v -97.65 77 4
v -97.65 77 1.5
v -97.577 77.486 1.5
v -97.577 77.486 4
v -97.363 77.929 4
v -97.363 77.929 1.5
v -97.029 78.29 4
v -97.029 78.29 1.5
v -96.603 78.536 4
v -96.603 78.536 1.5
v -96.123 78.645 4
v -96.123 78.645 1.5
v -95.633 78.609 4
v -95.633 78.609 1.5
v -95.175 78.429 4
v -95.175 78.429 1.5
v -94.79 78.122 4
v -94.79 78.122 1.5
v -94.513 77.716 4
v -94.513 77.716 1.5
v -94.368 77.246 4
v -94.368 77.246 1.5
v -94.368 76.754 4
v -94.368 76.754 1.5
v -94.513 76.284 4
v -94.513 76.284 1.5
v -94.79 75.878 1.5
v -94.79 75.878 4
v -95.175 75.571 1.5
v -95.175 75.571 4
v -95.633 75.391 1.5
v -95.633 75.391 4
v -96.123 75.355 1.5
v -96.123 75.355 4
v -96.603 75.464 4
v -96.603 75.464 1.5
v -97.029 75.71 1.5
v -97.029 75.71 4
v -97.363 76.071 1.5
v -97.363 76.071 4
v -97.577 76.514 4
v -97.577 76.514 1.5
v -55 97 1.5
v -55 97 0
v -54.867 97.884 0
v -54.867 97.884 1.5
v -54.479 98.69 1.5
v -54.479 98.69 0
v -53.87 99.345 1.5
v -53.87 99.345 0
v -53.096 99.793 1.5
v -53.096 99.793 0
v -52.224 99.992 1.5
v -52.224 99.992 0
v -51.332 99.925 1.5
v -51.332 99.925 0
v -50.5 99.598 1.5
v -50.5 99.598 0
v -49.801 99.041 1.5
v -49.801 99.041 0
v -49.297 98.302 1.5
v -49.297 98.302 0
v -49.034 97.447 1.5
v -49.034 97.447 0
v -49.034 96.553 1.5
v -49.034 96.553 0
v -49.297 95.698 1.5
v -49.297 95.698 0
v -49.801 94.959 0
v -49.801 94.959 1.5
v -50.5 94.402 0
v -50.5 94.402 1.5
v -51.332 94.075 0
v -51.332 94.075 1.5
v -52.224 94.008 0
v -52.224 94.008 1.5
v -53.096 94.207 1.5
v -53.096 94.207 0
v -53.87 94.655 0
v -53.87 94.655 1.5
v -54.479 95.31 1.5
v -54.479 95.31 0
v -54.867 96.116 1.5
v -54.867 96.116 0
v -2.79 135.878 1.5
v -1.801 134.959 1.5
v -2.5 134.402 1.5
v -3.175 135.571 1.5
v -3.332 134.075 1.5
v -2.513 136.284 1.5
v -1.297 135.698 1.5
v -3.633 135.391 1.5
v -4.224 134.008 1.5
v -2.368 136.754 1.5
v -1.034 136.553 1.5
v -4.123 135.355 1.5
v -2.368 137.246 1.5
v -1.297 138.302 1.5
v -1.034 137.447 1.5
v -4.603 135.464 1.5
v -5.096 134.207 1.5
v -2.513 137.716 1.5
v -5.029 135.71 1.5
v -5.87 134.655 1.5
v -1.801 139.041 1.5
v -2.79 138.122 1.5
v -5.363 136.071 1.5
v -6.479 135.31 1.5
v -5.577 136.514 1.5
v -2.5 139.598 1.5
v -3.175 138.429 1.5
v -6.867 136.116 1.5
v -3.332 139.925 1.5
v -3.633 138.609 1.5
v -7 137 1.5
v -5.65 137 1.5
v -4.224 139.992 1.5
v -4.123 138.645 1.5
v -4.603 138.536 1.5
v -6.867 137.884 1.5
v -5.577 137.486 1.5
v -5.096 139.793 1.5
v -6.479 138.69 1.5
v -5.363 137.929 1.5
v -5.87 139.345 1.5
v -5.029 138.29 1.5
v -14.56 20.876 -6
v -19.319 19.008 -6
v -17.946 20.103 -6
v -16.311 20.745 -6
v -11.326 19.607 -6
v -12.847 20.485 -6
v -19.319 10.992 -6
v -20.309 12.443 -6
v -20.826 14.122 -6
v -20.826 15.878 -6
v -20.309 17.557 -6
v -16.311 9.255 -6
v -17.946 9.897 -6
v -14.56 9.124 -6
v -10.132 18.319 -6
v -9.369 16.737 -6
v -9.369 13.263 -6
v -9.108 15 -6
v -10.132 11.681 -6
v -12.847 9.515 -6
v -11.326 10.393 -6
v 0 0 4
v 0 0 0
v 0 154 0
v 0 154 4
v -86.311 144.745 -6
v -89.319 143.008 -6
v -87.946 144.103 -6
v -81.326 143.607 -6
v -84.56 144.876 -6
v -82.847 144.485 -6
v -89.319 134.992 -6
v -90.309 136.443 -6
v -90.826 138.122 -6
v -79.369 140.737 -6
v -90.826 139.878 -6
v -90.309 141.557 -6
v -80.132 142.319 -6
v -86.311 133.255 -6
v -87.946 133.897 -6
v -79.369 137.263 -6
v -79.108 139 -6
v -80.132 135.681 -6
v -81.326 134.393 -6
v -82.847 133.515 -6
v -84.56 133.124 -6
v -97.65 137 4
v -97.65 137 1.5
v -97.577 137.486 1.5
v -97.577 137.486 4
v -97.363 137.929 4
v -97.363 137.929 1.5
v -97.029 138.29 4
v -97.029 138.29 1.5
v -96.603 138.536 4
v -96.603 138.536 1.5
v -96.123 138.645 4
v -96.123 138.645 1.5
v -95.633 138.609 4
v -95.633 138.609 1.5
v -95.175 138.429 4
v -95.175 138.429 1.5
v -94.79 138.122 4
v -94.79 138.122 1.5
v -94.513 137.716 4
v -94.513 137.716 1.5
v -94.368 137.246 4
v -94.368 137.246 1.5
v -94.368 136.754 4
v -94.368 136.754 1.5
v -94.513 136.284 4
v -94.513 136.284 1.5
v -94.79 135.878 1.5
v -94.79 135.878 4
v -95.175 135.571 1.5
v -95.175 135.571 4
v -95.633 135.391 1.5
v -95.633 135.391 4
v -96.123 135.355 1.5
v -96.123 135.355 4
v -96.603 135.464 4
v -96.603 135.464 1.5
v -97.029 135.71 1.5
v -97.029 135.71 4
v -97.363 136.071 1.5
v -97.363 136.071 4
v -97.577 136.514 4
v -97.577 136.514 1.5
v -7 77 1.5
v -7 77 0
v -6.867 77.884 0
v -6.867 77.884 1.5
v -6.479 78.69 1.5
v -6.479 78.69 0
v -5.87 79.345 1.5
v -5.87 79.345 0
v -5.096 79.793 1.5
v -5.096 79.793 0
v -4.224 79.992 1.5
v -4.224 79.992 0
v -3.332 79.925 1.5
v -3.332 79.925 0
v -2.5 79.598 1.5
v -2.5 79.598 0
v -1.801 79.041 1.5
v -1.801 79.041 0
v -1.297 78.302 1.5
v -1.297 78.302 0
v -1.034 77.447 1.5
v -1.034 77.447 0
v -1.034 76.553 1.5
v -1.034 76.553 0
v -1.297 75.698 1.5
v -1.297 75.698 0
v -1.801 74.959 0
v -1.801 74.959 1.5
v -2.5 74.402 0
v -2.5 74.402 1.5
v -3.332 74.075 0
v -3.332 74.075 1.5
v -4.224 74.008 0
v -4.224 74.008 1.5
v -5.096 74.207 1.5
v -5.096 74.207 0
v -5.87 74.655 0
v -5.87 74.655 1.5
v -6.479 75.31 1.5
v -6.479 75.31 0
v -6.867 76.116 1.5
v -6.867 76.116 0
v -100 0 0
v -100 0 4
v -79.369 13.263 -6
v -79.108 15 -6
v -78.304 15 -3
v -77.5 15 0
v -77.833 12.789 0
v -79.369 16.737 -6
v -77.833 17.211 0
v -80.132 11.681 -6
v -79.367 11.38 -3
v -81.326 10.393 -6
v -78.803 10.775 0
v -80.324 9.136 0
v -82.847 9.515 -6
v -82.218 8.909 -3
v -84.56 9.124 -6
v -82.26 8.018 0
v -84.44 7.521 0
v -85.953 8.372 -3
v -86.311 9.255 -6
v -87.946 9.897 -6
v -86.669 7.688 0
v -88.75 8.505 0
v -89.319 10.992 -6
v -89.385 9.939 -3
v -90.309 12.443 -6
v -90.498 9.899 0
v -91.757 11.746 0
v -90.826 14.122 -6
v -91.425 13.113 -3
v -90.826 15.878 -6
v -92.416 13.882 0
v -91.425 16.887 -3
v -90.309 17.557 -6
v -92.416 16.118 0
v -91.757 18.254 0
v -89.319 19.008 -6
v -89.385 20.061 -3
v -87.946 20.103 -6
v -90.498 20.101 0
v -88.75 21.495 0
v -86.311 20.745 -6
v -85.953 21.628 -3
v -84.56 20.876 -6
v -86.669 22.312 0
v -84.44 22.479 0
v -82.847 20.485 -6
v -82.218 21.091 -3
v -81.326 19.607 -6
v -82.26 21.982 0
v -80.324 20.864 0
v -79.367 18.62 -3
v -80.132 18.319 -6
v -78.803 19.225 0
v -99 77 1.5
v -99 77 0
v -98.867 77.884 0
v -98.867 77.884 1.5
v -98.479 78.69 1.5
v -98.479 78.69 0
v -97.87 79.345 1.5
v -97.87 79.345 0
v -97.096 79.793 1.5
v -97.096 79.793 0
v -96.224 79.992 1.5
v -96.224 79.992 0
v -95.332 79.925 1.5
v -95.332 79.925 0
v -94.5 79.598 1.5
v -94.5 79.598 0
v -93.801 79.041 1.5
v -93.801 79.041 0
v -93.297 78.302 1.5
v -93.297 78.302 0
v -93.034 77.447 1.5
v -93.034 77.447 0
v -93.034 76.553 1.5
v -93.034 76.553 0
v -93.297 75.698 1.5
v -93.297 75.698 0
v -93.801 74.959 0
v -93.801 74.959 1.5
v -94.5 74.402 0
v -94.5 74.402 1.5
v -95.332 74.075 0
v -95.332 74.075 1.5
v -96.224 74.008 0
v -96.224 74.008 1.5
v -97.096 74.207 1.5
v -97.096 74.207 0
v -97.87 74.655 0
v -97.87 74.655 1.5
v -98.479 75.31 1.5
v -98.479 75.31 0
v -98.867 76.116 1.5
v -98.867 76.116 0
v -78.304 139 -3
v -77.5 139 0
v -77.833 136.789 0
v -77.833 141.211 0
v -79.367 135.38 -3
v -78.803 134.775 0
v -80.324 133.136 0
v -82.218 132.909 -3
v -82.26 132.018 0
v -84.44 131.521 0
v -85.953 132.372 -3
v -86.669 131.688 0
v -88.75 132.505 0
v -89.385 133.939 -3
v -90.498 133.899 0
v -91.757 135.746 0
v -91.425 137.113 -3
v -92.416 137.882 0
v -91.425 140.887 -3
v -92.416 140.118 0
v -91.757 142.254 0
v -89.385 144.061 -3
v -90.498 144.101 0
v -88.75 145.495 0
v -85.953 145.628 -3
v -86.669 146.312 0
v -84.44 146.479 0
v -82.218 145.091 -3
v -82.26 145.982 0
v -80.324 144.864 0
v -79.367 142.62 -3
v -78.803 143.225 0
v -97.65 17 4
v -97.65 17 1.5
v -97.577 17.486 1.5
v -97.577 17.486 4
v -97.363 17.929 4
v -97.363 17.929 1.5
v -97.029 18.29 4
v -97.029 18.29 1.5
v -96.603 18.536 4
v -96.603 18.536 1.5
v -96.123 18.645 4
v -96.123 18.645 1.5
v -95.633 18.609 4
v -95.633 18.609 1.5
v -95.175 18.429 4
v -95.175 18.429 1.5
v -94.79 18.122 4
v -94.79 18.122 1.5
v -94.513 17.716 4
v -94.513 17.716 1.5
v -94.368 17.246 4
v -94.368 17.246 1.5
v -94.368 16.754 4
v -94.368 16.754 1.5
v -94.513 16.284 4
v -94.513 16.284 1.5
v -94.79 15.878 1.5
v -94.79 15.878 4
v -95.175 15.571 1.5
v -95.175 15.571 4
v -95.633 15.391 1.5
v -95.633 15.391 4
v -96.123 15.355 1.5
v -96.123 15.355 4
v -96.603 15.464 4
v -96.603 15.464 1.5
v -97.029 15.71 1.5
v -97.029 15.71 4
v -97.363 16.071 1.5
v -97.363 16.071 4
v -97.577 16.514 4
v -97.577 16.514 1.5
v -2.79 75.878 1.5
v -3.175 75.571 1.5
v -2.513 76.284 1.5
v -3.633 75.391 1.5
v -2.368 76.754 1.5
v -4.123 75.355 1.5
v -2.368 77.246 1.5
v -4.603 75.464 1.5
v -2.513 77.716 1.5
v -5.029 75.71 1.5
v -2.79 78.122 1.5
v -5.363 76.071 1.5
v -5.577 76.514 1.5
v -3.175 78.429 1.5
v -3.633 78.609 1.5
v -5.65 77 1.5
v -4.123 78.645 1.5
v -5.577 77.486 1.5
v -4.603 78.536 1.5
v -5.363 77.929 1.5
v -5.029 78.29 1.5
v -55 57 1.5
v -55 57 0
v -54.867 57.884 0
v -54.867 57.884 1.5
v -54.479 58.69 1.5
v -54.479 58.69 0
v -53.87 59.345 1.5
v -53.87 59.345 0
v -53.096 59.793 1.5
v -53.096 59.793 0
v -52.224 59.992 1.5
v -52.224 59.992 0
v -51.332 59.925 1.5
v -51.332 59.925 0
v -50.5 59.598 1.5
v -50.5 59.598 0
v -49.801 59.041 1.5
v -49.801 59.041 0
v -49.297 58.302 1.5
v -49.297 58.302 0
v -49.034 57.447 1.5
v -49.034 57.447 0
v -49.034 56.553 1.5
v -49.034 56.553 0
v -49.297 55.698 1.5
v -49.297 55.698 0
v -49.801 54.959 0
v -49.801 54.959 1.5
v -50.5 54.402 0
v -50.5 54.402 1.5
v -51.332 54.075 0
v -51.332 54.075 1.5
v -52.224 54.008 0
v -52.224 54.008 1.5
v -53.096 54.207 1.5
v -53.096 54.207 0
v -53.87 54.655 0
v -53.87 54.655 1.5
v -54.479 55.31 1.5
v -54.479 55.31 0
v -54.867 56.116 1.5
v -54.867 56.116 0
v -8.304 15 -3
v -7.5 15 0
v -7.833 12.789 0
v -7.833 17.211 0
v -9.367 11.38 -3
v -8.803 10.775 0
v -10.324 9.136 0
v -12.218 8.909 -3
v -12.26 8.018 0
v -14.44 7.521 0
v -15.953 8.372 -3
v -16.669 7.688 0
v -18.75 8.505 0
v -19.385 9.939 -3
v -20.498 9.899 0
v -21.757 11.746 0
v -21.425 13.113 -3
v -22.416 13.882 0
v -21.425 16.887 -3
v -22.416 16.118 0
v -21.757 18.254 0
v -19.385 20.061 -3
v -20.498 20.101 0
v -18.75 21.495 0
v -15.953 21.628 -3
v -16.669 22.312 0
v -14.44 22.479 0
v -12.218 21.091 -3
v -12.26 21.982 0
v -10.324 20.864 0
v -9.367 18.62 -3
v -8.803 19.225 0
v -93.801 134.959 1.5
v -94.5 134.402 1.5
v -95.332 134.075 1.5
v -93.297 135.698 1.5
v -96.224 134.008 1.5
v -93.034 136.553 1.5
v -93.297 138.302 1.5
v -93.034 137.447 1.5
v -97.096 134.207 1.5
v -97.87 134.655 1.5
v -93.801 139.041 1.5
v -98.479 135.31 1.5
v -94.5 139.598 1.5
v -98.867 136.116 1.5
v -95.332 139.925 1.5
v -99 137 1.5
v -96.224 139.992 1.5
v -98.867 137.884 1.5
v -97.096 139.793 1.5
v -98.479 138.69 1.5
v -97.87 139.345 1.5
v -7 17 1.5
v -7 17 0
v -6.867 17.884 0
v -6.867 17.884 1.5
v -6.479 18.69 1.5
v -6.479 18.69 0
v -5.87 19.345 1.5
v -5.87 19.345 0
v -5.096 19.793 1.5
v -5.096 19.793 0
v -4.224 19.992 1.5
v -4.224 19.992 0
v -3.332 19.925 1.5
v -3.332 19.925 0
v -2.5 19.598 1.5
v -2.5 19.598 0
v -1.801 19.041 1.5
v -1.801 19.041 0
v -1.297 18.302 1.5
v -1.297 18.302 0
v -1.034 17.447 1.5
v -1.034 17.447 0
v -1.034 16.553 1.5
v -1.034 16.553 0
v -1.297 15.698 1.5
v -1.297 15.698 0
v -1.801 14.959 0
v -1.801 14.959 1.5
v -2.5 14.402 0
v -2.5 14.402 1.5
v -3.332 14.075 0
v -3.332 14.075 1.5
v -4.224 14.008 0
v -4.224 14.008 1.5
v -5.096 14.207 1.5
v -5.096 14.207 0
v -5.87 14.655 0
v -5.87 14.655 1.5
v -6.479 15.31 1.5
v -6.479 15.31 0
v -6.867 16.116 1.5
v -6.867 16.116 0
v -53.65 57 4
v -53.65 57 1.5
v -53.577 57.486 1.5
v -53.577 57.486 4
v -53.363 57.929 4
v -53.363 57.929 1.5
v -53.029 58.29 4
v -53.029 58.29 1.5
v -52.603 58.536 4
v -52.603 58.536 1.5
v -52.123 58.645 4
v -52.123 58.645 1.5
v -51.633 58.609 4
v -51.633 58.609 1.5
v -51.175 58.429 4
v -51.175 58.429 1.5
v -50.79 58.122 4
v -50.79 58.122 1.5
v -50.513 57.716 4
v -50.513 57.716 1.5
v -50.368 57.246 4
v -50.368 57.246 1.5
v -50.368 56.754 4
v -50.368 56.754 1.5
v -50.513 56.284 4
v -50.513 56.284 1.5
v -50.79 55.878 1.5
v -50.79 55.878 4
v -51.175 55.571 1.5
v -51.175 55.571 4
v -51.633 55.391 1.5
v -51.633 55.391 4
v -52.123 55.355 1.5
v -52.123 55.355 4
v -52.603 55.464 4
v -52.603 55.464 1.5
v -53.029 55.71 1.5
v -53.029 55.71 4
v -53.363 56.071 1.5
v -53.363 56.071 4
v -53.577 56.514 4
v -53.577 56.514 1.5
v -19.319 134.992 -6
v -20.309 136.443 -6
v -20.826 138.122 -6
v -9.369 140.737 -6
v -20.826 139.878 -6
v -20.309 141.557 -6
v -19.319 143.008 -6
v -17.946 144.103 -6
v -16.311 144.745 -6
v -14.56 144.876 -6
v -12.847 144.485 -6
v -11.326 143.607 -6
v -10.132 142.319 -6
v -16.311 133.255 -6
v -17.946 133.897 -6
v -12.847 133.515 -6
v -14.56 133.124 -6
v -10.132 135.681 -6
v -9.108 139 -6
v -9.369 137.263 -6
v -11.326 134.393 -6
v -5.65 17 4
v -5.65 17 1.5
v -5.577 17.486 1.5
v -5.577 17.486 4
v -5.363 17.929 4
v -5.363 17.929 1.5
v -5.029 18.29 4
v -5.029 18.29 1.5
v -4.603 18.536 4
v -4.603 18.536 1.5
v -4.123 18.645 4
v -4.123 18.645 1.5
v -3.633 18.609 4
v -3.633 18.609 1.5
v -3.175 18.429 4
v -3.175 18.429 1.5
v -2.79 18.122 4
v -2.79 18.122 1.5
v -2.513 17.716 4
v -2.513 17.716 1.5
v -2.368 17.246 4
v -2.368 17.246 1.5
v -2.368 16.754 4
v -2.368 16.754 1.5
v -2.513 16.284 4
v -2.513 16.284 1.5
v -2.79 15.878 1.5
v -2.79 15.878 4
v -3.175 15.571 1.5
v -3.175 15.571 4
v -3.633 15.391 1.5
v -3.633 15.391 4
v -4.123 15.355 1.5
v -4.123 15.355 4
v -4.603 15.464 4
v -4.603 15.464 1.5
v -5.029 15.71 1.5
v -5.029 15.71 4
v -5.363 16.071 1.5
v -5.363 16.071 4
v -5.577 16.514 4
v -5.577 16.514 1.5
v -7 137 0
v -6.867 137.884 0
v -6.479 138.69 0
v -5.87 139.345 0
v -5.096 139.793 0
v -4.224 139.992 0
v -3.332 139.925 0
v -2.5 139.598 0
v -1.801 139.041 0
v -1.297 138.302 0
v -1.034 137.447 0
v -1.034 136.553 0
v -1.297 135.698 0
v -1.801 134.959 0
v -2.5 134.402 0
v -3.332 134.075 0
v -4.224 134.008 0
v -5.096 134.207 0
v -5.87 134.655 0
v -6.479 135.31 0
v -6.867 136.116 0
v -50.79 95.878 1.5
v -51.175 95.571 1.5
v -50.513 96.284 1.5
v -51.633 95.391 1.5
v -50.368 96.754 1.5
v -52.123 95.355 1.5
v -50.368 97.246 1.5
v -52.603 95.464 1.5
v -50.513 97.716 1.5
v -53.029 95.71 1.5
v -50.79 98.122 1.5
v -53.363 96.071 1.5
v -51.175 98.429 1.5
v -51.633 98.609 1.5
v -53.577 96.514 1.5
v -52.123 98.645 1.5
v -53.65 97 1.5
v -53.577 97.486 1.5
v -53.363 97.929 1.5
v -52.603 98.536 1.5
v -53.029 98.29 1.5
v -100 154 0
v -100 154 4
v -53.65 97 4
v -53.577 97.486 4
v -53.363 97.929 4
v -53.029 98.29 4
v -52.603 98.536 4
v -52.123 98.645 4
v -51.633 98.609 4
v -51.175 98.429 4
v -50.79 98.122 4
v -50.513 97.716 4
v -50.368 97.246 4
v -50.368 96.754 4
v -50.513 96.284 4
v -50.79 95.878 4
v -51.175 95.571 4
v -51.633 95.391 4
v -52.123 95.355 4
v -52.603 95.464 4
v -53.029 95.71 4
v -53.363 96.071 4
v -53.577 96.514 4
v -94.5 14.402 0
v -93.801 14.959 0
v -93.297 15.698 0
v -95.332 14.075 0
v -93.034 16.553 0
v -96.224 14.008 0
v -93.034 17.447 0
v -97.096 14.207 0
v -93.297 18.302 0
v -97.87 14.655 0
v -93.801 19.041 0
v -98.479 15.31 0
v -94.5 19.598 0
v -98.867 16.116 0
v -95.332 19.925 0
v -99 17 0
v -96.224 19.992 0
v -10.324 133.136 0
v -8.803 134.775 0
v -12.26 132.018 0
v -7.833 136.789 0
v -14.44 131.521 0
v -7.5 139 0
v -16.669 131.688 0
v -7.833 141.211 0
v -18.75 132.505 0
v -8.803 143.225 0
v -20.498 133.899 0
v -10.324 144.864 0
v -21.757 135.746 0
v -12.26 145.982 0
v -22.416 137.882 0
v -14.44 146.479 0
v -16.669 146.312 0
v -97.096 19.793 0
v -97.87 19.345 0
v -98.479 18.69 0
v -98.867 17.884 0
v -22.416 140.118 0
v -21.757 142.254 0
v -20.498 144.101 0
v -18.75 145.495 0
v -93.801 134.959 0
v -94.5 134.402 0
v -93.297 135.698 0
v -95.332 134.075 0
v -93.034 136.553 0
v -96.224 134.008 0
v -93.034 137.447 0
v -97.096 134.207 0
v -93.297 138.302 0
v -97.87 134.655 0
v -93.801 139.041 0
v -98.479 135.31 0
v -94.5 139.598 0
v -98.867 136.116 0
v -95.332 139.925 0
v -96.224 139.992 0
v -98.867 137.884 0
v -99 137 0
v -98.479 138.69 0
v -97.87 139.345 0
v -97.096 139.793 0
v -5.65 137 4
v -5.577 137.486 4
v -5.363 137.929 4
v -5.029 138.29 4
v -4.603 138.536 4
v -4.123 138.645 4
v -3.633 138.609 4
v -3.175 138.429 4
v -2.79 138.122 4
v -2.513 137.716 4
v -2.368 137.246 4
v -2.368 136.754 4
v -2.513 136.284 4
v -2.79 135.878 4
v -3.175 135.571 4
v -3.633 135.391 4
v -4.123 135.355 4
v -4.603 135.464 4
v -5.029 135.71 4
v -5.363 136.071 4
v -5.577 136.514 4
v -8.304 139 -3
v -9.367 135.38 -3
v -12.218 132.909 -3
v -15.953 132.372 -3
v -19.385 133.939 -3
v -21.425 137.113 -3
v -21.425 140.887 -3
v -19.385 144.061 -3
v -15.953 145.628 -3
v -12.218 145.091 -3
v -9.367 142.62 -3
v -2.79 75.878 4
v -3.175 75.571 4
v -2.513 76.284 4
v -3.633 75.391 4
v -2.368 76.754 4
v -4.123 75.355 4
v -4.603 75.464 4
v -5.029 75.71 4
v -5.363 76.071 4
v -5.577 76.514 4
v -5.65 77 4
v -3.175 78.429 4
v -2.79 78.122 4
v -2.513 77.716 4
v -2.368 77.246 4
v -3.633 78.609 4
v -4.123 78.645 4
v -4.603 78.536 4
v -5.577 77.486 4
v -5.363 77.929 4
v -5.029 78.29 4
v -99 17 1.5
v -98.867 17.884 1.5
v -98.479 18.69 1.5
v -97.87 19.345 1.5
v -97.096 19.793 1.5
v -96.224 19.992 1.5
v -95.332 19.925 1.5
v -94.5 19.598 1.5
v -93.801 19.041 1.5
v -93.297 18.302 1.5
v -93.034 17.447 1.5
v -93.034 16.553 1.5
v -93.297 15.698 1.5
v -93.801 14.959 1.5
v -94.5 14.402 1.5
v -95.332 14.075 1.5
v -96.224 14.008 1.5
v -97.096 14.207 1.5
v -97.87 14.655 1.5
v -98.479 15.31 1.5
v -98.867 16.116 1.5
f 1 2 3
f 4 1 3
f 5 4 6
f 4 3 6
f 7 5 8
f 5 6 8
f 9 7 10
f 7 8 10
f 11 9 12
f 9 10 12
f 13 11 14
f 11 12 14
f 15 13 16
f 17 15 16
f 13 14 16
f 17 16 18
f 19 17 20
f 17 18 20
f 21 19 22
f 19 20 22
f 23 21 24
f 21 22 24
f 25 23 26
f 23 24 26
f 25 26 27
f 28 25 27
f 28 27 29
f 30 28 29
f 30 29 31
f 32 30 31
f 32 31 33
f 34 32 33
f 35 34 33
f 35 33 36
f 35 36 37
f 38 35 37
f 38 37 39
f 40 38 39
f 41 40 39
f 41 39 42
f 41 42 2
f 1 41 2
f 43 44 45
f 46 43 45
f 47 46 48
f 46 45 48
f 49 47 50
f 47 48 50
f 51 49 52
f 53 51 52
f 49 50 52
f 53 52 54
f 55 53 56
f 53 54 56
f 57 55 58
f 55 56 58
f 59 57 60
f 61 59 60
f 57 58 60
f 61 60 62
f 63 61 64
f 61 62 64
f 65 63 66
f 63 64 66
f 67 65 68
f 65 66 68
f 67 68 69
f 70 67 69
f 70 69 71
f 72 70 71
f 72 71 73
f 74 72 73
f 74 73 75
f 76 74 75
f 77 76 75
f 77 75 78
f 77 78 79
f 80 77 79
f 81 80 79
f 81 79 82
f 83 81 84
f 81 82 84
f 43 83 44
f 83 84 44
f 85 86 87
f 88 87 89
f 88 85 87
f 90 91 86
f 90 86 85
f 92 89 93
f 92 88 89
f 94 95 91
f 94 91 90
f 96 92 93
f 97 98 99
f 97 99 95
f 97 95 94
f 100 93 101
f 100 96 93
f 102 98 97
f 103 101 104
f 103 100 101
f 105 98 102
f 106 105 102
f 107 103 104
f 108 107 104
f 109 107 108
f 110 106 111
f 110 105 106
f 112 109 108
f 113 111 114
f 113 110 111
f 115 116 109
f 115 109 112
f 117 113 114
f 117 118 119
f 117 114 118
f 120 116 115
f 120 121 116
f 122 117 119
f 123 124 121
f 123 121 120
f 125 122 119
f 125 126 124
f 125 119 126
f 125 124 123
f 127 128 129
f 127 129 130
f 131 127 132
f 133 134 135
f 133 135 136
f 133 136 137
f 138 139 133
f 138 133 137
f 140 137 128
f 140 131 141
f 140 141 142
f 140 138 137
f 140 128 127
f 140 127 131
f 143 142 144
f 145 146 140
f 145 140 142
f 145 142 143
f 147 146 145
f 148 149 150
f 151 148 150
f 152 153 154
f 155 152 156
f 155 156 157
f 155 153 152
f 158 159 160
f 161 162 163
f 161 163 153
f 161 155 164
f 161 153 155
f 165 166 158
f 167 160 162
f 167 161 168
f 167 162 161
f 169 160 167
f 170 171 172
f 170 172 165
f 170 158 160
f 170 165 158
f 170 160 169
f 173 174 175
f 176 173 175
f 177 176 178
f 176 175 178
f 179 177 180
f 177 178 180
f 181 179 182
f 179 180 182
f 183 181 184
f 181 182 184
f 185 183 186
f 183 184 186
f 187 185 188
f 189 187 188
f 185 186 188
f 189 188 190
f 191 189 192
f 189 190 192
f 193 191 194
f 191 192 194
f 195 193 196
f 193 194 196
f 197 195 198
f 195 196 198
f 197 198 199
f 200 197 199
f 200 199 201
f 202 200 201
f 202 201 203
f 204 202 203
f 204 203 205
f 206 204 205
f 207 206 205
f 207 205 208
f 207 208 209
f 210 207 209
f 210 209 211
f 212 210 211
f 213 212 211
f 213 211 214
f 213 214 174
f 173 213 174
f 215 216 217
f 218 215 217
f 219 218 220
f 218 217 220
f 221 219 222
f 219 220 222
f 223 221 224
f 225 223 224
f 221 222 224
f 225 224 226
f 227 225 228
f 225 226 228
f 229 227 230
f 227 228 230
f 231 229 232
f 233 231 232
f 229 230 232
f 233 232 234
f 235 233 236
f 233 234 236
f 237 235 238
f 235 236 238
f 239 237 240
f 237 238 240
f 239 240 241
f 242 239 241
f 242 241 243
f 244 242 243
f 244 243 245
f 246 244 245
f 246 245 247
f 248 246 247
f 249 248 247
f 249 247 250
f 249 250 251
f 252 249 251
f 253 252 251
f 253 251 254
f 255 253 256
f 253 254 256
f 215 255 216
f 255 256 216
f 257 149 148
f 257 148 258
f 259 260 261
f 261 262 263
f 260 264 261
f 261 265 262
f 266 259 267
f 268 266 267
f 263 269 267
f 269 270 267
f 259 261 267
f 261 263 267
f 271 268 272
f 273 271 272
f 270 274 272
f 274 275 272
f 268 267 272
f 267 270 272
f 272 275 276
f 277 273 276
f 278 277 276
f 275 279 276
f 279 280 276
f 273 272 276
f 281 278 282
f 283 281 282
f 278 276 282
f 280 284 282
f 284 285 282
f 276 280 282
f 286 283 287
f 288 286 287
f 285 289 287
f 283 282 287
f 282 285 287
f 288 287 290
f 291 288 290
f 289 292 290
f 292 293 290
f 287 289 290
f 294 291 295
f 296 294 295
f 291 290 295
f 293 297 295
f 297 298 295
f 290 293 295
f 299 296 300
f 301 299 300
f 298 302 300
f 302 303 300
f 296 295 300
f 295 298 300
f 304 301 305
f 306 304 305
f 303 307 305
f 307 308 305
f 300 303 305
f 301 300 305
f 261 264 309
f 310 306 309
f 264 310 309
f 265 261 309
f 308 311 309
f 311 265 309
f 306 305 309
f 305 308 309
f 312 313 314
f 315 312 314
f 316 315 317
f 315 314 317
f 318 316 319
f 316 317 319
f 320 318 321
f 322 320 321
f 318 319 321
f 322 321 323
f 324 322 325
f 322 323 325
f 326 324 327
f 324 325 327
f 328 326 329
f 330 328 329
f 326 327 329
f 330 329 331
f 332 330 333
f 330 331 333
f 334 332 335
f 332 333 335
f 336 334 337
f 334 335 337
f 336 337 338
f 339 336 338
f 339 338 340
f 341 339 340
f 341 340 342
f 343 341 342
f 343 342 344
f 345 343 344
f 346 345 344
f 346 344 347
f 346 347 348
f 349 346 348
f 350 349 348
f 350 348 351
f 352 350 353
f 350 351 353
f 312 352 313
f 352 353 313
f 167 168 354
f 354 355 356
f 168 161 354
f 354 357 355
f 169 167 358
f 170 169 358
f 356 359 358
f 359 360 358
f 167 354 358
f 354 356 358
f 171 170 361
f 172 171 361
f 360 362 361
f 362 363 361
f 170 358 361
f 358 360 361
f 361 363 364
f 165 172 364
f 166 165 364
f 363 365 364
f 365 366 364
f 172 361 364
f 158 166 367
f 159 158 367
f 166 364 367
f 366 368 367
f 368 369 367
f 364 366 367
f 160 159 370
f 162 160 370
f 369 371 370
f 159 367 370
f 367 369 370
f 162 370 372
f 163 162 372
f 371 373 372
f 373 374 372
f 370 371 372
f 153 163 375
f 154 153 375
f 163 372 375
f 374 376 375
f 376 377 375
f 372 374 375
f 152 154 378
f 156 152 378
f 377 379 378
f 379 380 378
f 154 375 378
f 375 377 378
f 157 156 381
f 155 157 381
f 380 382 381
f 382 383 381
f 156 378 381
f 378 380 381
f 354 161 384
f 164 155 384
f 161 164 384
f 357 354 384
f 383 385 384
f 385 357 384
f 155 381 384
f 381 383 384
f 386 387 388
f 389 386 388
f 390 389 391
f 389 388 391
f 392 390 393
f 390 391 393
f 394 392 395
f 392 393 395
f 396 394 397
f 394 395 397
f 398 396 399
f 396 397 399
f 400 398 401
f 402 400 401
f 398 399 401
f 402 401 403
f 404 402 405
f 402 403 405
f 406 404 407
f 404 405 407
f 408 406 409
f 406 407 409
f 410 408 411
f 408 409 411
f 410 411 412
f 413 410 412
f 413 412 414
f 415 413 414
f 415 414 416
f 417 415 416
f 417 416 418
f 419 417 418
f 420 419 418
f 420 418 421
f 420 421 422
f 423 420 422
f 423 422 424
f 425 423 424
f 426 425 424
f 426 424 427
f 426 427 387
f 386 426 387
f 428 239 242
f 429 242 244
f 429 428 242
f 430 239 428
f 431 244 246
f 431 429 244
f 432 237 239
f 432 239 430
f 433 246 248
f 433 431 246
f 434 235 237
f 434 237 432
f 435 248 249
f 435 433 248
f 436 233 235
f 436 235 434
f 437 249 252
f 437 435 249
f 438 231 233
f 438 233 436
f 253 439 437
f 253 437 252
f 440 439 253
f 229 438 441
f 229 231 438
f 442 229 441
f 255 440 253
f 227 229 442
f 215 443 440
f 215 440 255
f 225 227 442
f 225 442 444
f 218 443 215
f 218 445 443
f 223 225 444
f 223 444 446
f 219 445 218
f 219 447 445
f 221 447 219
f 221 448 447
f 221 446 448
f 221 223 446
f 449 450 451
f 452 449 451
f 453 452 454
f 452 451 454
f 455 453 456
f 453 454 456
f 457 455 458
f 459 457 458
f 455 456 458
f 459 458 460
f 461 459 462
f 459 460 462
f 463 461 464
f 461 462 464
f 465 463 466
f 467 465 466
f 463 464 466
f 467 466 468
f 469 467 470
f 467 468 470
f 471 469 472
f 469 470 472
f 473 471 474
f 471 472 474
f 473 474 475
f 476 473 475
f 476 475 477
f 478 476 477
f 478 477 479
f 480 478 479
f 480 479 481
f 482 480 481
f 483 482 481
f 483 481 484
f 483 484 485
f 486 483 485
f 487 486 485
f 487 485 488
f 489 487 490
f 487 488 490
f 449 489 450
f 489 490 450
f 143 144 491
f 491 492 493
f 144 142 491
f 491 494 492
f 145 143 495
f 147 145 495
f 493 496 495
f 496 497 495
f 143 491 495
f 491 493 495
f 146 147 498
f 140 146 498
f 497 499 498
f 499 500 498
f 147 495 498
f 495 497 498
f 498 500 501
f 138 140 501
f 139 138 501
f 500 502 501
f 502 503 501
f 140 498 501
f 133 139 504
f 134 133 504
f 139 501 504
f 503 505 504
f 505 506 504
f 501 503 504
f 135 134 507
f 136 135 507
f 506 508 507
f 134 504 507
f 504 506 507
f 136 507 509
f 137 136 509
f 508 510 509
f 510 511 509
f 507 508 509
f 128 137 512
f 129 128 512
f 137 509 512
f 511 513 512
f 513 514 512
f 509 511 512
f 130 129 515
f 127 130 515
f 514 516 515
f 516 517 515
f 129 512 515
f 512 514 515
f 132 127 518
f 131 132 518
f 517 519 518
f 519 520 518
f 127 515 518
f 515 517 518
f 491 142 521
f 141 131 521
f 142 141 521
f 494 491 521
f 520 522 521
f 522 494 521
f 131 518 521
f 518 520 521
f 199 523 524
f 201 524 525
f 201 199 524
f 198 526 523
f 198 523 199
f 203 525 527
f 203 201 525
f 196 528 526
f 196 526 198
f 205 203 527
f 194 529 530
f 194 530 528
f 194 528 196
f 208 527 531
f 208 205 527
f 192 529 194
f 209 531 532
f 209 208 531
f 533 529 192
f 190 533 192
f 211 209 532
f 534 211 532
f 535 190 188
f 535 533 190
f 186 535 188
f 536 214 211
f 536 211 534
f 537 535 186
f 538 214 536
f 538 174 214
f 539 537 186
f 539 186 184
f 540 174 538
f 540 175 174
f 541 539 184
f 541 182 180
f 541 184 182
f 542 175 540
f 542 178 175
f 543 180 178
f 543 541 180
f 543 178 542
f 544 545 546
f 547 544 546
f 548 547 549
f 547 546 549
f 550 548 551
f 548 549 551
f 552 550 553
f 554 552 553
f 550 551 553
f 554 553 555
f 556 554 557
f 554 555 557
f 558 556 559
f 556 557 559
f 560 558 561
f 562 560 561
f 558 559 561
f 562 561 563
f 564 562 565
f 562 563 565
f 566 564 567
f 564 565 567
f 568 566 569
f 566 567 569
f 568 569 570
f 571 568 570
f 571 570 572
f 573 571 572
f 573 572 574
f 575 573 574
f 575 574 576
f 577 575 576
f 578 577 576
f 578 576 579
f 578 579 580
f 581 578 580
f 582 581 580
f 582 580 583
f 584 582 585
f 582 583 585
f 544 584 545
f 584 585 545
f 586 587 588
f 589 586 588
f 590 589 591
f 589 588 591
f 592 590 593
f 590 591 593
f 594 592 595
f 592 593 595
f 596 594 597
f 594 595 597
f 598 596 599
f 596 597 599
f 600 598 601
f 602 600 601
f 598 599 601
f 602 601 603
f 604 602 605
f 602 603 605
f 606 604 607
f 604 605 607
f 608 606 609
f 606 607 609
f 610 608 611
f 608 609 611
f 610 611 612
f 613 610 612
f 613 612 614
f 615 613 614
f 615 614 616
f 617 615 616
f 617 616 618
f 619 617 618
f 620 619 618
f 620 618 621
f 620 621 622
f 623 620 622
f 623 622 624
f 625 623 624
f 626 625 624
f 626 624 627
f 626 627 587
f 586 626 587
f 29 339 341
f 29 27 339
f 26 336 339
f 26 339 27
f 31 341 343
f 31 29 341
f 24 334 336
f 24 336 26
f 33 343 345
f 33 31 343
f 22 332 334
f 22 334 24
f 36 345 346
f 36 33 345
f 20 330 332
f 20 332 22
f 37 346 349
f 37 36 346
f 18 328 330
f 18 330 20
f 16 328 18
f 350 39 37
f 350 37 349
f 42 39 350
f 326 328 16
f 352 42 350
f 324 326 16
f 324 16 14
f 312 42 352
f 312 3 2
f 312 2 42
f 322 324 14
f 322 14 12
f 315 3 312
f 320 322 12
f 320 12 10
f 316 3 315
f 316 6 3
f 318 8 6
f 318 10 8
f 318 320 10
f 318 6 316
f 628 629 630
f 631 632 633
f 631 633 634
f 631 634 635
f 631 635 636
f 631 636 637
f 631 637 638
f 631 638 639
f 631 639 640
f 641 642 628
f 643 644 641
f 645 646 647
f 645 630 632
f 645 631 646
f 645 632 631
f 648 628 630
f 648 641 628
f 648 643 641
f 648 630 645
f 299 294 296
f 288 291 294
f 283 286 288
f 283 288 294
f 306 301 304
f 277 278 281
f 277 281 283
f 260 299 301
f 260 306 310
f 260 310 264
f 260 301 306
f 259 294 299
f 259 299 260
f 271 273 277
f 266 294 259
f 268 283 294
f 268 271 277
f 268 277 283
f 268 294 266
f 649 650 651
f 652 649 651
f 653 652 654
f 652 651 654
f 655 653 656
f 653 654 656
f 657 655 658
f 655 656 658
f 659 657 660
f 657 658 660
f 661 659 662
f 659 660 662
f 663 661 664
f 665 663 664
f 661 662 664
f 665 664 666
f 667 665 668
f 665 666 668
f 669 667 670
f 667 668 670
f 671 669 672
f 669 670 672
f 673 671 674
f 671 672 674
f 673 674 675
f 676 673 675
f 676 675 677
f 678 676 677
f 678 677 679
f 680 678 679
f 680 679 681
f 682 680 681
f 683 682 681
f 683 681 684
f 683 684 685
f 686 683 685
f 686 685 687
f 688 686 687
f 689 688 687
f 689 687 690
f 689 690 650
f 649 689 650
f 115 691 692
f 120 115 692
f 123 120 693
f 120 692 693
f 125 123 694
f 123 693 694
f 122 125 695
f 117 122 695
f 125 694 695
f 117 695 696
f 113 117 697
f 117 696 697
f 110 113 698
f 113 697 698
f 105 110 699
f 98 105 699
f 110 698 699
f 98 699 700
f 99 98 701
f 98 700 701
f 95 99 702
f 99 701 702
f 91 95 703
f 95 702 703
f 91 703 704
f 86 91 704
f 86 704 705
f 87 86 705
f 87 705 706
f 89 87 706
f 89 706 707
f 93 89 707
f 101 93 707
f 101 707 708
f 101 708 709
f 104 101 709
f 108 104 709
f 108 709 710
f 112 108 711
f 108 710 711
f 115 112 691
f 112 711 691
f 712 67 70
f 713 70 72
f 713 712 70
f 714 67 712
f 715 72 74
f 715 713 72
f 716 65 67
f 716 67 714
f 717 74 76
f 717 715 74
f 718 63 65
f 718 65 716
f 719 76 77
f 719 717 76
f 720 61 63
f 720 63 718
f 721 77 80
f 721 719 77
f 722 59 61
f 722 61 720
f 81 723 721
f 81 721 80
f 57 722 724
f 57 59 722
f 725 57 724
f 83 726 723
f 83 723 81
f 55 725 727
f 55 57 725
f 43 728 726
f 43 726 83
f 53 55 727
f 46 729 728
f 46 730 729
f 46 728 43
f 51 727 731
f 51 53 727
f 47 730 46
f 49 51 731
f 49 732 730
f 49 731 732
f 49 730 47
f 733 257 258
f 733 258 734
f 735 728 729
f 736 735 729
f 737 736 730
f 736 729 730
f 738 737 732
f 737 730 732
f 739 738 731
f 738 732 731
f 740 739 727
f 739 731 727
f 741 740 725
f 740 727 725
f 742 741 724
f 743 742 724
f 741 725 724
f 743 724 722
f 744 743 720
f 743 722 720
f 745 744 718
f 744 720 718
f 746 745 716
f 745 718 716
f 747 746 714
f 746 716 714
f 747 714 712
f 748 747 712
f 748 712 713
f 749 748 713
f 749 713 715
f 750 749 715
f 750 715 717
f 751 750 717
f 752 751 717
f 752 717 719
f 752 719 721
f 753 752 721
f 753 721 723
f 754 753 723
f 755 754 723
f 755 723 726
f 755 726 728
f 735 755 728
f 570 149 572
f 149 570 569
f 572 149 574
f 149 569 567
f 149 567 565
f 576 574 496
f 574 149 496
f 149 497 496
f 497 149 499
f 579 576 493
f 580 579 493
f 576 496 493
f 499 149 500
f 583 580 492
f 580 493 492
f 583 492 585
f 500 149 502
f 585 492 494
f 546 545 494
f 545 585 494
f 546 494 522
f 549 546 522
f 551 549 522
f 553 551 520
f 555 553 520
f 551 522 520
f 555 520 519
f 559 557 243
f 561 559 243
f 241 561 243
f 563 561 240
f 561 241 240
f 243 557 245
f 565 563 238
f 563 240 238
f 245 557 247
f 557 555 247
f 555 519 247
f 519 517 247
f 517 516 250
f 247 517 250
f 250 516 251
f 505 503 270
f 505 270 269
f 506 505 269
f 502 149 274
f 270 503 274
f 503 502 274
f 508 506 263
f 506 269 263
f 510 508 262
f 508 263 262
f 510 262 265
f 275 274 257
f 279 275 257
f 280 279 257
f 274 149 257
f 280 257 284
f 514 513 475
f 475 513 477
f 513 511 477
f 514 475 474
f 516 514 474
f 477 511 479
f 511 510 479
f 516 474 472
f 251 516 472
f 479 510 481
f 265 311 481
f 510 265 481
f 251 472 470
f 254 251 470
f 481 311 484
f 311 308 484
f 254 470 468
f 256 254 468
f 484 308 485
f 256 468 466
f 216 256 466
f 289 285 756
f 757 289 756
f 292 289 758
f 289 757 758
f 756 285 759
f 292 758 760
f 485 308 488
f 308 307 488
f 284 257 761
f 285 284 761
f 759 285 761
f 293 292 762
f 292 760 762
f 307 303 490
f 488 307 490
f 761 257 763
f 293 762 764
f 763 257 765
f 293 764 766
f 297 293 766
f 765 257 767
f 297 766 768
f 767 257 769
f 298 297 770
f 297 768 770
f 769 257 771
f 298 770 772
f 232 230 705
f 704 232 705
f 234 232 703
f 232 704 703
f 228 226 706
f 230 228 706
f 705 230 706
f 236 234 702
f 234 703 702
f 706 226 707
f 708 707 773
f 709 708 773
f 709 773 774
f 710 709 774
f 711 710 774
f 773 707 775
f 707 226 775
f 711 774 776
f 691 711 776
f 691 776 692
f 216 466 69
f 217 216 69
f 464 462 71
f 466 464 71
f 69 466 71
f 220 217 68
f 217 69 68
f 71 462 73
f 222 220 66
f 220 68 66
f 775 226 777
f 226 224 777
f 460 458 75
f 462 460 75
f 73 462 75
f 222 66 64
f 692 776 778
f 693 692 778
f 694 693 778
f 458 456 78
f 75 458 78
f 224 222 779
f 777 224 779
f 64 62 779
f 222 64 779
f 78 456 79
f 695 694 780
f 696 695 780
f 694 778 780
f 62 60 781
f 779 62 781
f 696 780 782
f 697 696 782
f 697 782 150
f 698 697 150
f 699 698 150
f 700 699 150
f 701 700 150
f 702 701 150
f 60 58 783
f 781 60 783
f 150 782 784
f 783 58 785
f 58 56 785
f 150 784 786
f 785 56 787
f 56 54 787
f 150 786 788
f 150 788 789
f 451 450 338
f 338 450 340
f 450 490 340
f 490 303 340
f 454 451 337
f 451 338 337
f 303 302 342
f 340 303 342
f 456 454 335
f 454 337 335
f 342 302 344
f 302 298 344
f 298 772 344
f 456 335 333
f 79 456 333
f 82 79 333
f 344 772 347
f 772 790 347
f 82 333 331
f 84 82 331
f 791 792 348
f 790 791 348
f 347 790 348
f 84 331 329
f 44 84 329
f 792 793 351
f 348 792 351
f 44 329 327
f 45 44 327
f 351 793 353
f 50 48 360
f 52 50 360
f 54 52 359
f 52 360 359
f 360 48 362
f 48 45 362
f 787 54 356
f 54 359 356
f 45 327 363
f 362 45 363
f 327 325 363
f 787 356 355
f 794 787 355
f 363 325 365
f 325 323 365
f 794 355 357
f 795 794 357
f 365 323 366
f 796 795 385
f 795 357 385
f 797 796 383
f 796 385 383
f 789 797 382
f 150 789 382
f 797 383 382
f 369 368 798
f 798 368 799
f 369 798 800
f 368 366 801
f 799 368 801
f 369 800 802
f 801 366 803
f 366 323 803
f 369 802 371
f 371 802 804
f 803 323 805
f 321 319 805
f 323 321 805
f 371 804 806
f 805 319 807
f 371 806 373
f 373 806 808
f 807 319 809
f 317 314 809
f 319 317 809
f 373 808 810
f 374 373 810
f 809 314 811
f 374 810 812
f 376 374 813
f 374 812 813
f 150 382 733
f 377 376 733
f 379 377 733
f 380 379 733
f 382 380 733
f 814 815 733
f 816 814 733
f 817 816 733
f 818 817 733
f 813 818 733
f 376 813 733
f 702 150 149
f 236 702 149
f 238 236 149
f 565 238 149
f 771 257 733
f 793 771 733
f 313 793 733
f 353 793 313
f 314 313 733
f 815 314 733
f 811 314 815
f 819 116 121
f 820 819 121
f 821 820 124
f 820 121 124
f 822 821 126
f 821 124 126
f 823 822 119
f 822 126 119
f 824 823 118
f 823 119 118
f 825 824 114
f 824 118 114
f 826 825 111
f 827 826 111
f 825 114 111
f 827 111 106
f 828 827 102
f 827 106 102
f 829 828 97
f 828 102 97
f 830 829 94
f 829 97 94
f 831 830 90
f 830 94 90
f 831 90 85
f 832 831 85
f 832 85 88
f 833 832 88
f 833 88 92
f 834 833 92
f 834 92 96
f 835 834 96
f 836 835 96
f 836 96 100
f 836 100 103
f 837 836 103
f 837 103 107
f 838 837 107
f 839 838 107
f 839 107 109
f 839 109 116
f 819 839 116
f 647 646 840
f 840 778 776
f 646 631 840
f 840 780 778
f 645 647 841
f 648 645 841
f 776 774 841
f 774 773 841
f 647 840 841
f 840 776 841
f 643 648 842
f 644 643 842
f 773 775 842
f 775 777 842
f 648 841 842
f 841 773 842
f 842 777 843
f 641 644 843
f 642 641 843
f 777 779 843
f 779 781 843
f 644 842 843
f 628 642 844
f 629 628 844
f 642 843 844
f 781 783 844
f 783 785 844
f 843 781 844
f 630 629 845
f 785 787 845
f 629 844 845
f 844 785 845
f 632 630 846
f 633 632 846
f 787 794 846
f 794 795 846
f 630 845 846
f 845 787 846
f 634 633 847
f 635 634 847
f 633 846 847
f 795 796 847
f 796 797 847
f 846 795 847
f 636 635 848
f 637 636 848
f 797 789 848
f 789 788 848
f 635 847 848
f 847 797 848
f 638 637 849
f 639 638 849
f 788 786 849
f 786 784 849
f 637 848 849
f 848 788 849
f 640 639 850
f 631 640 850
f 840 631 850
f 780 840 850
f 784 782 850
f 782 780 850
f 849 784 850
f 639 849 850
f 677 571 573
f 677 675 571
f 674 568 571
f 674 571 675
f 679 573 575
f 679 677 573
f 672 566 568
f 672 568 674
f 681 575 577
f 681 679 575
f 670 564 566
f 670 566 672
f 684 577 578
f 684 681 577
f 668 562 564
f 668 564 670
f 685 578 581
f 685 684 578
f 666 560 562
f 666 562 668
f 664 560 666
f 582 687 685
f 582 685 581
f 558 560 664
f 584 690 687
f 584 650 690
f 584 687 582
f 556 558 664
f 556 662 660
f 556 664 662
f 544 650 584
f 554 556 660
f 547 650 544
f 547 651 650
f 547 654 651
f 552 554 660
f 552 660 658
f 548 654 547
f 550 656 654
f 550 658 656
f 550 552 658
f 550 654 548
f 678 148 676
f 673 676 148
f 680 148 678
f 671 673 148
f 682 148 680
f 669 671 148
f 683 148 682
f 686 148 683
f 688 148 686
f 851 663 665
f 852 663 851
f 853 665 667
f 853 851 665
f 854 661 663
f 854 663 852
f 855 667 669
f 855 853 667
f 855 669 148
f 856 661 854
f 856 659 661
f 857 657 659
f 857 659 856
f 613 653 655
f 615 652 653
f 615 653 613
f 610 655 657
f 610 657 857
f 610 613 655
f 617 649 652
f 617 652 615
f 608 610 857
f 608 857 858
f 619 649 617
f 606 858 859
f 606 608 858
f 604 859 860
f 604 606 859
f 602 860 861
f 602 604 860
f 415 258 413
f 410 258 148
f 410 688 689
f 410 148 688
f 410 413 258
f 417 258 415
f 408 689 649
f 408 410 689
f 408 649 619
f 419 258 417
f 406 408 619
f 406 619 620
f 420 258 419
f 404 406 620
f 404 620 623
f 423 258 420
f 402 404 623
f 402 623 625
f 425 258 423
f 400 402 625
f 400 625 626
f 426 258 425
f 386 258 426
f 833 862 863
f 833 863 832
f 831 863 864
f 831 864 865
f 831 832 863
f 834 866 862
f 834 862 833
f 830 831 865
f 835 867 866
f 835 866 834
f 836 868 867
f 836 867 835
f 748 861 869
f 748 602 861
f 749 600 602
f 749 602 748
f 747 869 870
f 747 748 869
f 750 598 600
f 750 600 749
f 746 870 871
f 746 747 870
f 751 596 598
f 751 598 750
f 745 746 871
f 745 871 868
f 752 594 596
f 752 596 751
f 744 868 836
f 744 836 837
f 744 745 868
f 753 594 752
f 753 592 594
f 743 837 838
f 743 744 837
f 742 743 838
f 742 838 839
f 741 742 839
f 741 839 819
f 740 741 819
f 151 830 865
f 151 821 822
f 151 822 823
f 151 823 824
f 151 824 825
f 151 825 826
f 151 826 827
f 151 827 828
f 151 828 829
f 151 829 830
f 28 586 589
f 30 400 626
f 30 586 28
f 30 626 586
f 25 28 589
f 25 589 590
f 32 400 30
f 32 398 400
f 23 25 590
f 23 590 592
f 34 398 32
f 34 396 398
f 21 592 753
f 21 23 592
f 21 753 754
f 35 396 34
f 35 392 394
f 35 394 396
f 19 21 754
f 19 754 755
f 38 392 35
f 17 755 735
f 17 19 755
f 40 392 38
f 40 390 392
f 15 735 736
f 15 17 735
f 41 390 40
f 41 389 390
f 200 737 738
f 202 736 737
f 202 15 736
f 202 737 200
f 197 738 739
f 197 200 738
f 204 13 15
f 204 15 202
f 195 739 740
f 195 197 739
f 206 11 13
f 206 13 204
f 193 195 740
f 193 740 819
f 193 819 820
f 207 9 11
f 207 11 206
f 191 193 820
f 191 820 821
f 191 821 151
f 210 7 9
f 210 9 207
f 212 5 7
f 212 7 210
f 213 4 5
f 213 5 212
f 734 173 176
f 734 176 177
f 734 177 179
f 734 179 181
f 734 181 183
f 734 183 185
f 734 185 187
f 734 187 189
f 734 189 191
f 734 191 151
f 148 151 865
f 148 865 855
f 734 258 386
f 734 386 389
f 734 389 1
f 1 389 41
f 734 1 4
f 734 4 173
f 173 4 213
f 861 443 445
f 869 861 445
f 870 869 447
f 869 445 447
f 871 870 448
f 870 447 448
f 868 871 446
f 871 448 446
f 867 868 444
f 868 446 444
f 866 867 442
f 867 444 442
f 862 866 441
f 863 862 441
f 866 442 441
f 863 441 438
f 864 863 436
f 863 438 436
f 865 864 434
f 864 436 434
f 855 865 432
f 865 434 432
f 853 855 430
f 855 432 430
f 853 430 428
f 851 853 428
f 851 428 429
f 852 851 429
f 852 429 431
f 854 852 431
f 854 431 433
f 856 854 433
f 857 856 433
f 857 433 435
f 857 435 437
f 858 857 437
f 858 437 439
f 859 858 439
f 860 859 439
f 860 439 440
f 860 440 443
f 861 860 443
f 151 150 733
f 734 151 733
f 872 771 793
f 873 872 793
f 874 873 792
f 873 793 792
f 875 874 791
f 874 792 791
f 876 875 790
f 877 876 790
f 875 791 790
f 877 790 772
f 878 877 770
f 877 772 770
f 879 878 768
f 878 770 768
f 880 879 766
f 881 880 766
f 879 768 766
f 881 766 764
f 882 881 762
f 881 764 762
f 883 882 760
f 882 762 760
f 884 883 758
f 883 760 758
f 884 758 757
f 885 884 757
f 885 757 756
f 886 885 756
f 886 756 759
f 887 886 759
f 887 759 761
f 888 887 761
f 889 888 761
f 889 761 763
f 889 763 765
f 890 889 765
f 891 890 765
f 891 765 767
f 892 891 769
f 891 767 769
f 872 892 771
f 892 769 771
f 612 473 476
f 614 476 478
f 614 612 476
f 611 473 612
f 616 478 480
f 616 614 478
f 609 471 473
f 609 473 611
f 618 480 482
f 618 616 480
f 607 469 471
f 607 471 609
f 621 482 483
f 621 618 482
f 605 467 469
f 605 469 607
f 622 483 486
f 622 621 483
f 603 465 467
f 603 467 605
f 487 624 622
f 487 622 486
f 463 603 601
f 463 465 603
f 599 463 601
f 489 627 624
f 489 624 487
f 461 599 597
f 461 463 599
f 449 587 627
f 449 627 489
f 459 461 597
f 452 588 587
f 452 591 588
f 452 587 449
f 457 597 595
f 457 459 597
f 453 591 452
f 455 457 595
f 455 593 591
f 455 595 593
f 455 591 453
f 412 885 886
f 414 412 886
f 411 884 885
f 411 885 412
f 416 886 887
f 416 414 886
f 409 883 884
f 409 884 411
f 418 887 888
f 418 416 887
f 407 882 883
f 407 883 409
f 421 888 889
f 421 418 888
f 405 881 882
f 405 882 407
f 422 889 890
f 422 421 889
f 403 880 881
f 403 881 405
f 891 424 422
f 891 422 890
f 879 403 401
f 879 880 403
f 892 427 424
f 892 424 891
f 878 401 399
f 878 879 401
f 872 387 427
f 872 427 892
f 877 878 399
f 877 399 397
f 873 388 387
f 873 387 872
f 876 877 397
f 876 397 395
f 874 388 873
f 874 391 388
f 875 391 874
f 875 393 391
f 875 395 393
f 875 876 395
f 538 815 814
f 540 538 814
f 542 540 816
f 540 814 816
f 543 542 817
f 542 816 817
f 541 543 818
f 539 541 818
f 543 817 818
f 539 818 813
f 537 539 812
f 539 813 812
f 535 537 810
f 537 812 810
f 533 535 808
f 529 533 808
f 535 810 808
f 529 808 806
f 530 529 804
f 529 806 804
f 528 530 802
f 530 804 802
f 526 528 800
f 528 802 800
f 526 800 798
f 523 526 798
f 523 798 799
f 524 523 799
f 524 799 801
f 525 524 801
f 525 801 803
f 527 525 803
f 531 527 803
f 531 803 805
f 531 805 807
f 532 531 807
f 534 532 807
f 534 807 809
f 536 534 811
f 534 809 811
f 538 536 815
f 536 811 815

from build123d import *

# Parameters (mm, degrees)
SKETCH1_W                     = 154
SKETCH1_H                     = 100
BOSS_EXTRUDE1_DEPTH           = 4
SKETCH2_R                     = 1.65
CUT_EXTRUDE1_DEPTH            = 184.66273438
SKETCH3_R                     = 7.5
BOSS_EXTRUDE2_DEPTH           = 6
BOSS_EXTRUDE2_DRAFT           = 15
BOSS_EXTRUDE2_PROFILE_2_DEPTH = 6
BOSS_EXTRUDE2_PROFILE_2_DRAFT = 15
BOSS_EXTRUDE2_PROFILE_3_DEPTH = 6
BOSS_EXTRUDE2_PROFILE_3_DRAFT = 15
BOSS_EXTRUDE2_PROFILE_4_DEPTH = 6
BOSS_EXTRUDE2_PROFILE_4_DRAFT = 15
SKETCH4_R                     = 3
CUT_EXTRUDE2_DEPTH            = 1.5


with BuildPart() as part:
    # Sketch1 → Boss-Extrude1 (new body)
    with BuildSketch(Plane(origin=(0, 0, 0), x_dir=(0, 1, 0), z_dir=(0, 0, 1))):
        with Locations((77, 50)):
            Rectangle(SKETCH1_W, SKETCH1_H)
    extrude(amount=BOSS_EXTRUDE1_DEPTH)

    # Sketch2 → Cut-Extrude1 (cut, through all)
    with BuildSketch(Plane(origin=(0, 0, 0), x_dir=(1, 0, 0), z_dir=(0, 0, -1))):
        with Locations(Location((-4, -77, 0), (0, 0, 180))):
            Circle(SKETCH2_R)
        with Locations(Location((-4, -17, 0), (0, 0, 180))):
            Circle(SKETCH2_R)
        with Locations(Location((-4, -137, 0), (0, 0, 180))):
            Circle(SKETCH2_R)
        with Locations(Location((-96, -137, 0), (0, 0, 180))):
            Circle(SKETCH2_R)
        with Locations(Location((-96, -77, 0), (0, 0, 180))):
            Circle(SKETCH2_R)
        with Locations(Location((-96, -17, 0), (0, 0, 180))):
            Circle(SKETCH2_R)
        with Locations(Location((-52, -97, 0), (0, 0, 180))):
            Circle(SKETCH2_R)
        with Locations(Location((-52, -57, 0), (0, 0, 180))):
            Circle(SKETCH2_R)
    extrude(amount=-CUT_EXTRUDE1_DEPTH, mode=Mode.SUBTRACT)


with BuildPart() as boss_extrude2_tool:
    # Sketch3 → Boss-Extrude2 (with draft: the straight prism first)
    with BuildSketch(Plane(origin=(0, 0, 0), x_dir=(1, 0, 0), z_dir=(0, 0, -1))):
        with Locations((-85, -15)):
            Circle(SKETCH3_R)
    extrude(amount=BOSS_EXTRUDE2_DEPTH)
    # Boss-Extrude2: the draft: its side faces are tilted about the plane it starts from
    boss_extrude2_sides = [boss_extrude2_tool.faces().sort_by_distance(p)[0] for p in [
        (-92.5, 15, -3),
    ]]
    draft(boss_extrude2_sides, Plane(origin=(0, 0, 0), x_dir=(1, 0, 0), z_dir=(0, 0, -1)), BOSS_EXTRUDE2_DRAFT)


with BuildPart() as part_1:
    add(part.part)

    # Boss-Extrude2: add boss_extrude2_tool
    add(boss_extrude2_tool.part)


with BuildPart() as boss_extrude2_profile_2_tool:
    # Sketch3 → Boss-Extrude2 profile 2 (with draft: the straight prism first)
    with BuildSketch(Plane(origin=(0, 0, 0), x_dir=(1, 0, 0), z_dir=(0, 0, -1))):
        with Locations((-15, -15)):
            Circle(SKETCH3_R)
    extrude(amount=BOSS_EXTRUDE2_PROFILE_2_DEPTH)
    # Boss-Extrude2 profile 2: the draft: its side faces are tilted about the plane it starts from
    boss_extrude2_profile_2_sides = [boss_extrude2_profile_2_tool.faces().sort_by_distance(p)[0] for p in [
        (-22.5, 15, -3),
    ]]
    draft(boss_extrude2_profile_2_sides, Plane(origin=(0, 0, 0), x_dir=(1, 0, 0), z_dir=(0, 0, -1)), BOSS_EXTRUDE2_PROFILE_2_DRAFT)


with BuildPart() as part_2:
    add(part_1.part)

    # Boss-Extrude2 profile 2: add boss_extrude2_profile_2_tool
    add(boss_extrude2_profile_2_tool.part)


with BuildPart() as boss_extrude2_profile_3_tool:
    # Sketch3 → Boss-Extrude2 profile 3 (with draft: the straight prism first)
    with BuildSketch(Plane(origin=(0, 0, 0), x_dir=(1, 0, 0), z_dir=(0, 0, -1))):
        with Locations((-15, -139)):
            Circle(SKETCH3_R)
    extrude(amount=BOSS_EXTRUDE2_PROFILE_3_DEPTH)
    # Boss-Extrude2 profile 3: the draft: its side faces are tilted about the plane it starts from
    boss_extrude2_profile_3_sides = [boss_extrude2_profile_3_tool.faces().sort_by_distance(p)[0] for p in [
        (-22.5, 139, -3),
    ]]
    draft(boss_extrude2_profile_3_sides, Plane(origin=(0, 0, 0), x_dir=(1, 0, 0), z_dir=(0, 0, -1)), BOSS_EXTRUDE2_PROFILE_3_DRAFT)


with BuildPart() as part_3:
    add(part_2.part)

    # Boss-Extrude2 profile 3: add boss_extrude2_profile_3_tool
    add(boss_extrude2_profile_3_tool.part)


with BuildPart() as boss_extrude2_profile_4_tool:
    # Sketch3 → Boss-Extrude2 profile 4 (with draft: the straight prism first)
    with BuildSketch(Plane(origin=(0, 0, 0), x_dir=(1, 0, 0), z_dir=(0, 0, -1))):
        with Locations((-85, -139)):
            Circle(SKETCH3_R)
    extrude(amount=BOSS_EXTRUDE2_PROFILE_4_DEPTH)
    # Boss-Extrude2 profile 4: the draft: its side faces are tilted about the plane it starts from
    boss_extrude2_profile_4_sides = [boss_extrude2_profile_4_tool.faces().sort_by_distance(p)[0] for p in [
        (-92.5, 139, -3),
    ]]
    draft(boss_extrude2_profile_4_sides, Plane(origin=(0, 0, 0), x_dir=(1, 0, 0), z_dir=(0, 0, -1)), BOSS_EXTRUDE2_PROFILE_4_DRAFT)


with BuildPart() as part_4:
    add(part_3.part)

    # Boss-Extrude2 profile 4: add boss_extrude2_profile_4_tool
    add(boss_extrude2_profile_4_tool.part)

    # Sketch4 → Cut-Extrude2 (cut)
    with BuildSketch(Plane(origin=(0, 0, 0), x_dir=(1, 0, 0), z_dir=(0, 0, -1))):
        with Locations(Location((-96, -17, 0), (0, 0, 180))):
            Circle(SKETCH4_R)
        with Locations(Location((-4, -17, 0), (0, 0, 180))):
            Circle(SKETCH4_R)
        with Locations(Location((-4, -77, 0), (0, 0, 180))):
            Circle(SKETCH4_R)
        with Locations(Location((-96, -77, 0), (0, 0, 180))):
            Circle(SKETCH4_R)
        with Locations(Location((-96, -137, 0), (0, 0, 180))):
            Circle(SKETCH4_R)
        with Locations(Location((-4, -137, 0), (0, 0, 180))):
            Circle(SKETCH4_R)
        with Locations(Location((-52, -57, 0), (0, 0, 180))):
            Circle(SKETCH4_R)
        with Locations(Location((-52, -97, 0), (0, 0, 180))):
            Circle(SKETCH4_R)
    extrude(amount=-CUT_EXTRUDE2_DEPTH, mode=Mode.SUBTRACT)


solid = part_4.part
